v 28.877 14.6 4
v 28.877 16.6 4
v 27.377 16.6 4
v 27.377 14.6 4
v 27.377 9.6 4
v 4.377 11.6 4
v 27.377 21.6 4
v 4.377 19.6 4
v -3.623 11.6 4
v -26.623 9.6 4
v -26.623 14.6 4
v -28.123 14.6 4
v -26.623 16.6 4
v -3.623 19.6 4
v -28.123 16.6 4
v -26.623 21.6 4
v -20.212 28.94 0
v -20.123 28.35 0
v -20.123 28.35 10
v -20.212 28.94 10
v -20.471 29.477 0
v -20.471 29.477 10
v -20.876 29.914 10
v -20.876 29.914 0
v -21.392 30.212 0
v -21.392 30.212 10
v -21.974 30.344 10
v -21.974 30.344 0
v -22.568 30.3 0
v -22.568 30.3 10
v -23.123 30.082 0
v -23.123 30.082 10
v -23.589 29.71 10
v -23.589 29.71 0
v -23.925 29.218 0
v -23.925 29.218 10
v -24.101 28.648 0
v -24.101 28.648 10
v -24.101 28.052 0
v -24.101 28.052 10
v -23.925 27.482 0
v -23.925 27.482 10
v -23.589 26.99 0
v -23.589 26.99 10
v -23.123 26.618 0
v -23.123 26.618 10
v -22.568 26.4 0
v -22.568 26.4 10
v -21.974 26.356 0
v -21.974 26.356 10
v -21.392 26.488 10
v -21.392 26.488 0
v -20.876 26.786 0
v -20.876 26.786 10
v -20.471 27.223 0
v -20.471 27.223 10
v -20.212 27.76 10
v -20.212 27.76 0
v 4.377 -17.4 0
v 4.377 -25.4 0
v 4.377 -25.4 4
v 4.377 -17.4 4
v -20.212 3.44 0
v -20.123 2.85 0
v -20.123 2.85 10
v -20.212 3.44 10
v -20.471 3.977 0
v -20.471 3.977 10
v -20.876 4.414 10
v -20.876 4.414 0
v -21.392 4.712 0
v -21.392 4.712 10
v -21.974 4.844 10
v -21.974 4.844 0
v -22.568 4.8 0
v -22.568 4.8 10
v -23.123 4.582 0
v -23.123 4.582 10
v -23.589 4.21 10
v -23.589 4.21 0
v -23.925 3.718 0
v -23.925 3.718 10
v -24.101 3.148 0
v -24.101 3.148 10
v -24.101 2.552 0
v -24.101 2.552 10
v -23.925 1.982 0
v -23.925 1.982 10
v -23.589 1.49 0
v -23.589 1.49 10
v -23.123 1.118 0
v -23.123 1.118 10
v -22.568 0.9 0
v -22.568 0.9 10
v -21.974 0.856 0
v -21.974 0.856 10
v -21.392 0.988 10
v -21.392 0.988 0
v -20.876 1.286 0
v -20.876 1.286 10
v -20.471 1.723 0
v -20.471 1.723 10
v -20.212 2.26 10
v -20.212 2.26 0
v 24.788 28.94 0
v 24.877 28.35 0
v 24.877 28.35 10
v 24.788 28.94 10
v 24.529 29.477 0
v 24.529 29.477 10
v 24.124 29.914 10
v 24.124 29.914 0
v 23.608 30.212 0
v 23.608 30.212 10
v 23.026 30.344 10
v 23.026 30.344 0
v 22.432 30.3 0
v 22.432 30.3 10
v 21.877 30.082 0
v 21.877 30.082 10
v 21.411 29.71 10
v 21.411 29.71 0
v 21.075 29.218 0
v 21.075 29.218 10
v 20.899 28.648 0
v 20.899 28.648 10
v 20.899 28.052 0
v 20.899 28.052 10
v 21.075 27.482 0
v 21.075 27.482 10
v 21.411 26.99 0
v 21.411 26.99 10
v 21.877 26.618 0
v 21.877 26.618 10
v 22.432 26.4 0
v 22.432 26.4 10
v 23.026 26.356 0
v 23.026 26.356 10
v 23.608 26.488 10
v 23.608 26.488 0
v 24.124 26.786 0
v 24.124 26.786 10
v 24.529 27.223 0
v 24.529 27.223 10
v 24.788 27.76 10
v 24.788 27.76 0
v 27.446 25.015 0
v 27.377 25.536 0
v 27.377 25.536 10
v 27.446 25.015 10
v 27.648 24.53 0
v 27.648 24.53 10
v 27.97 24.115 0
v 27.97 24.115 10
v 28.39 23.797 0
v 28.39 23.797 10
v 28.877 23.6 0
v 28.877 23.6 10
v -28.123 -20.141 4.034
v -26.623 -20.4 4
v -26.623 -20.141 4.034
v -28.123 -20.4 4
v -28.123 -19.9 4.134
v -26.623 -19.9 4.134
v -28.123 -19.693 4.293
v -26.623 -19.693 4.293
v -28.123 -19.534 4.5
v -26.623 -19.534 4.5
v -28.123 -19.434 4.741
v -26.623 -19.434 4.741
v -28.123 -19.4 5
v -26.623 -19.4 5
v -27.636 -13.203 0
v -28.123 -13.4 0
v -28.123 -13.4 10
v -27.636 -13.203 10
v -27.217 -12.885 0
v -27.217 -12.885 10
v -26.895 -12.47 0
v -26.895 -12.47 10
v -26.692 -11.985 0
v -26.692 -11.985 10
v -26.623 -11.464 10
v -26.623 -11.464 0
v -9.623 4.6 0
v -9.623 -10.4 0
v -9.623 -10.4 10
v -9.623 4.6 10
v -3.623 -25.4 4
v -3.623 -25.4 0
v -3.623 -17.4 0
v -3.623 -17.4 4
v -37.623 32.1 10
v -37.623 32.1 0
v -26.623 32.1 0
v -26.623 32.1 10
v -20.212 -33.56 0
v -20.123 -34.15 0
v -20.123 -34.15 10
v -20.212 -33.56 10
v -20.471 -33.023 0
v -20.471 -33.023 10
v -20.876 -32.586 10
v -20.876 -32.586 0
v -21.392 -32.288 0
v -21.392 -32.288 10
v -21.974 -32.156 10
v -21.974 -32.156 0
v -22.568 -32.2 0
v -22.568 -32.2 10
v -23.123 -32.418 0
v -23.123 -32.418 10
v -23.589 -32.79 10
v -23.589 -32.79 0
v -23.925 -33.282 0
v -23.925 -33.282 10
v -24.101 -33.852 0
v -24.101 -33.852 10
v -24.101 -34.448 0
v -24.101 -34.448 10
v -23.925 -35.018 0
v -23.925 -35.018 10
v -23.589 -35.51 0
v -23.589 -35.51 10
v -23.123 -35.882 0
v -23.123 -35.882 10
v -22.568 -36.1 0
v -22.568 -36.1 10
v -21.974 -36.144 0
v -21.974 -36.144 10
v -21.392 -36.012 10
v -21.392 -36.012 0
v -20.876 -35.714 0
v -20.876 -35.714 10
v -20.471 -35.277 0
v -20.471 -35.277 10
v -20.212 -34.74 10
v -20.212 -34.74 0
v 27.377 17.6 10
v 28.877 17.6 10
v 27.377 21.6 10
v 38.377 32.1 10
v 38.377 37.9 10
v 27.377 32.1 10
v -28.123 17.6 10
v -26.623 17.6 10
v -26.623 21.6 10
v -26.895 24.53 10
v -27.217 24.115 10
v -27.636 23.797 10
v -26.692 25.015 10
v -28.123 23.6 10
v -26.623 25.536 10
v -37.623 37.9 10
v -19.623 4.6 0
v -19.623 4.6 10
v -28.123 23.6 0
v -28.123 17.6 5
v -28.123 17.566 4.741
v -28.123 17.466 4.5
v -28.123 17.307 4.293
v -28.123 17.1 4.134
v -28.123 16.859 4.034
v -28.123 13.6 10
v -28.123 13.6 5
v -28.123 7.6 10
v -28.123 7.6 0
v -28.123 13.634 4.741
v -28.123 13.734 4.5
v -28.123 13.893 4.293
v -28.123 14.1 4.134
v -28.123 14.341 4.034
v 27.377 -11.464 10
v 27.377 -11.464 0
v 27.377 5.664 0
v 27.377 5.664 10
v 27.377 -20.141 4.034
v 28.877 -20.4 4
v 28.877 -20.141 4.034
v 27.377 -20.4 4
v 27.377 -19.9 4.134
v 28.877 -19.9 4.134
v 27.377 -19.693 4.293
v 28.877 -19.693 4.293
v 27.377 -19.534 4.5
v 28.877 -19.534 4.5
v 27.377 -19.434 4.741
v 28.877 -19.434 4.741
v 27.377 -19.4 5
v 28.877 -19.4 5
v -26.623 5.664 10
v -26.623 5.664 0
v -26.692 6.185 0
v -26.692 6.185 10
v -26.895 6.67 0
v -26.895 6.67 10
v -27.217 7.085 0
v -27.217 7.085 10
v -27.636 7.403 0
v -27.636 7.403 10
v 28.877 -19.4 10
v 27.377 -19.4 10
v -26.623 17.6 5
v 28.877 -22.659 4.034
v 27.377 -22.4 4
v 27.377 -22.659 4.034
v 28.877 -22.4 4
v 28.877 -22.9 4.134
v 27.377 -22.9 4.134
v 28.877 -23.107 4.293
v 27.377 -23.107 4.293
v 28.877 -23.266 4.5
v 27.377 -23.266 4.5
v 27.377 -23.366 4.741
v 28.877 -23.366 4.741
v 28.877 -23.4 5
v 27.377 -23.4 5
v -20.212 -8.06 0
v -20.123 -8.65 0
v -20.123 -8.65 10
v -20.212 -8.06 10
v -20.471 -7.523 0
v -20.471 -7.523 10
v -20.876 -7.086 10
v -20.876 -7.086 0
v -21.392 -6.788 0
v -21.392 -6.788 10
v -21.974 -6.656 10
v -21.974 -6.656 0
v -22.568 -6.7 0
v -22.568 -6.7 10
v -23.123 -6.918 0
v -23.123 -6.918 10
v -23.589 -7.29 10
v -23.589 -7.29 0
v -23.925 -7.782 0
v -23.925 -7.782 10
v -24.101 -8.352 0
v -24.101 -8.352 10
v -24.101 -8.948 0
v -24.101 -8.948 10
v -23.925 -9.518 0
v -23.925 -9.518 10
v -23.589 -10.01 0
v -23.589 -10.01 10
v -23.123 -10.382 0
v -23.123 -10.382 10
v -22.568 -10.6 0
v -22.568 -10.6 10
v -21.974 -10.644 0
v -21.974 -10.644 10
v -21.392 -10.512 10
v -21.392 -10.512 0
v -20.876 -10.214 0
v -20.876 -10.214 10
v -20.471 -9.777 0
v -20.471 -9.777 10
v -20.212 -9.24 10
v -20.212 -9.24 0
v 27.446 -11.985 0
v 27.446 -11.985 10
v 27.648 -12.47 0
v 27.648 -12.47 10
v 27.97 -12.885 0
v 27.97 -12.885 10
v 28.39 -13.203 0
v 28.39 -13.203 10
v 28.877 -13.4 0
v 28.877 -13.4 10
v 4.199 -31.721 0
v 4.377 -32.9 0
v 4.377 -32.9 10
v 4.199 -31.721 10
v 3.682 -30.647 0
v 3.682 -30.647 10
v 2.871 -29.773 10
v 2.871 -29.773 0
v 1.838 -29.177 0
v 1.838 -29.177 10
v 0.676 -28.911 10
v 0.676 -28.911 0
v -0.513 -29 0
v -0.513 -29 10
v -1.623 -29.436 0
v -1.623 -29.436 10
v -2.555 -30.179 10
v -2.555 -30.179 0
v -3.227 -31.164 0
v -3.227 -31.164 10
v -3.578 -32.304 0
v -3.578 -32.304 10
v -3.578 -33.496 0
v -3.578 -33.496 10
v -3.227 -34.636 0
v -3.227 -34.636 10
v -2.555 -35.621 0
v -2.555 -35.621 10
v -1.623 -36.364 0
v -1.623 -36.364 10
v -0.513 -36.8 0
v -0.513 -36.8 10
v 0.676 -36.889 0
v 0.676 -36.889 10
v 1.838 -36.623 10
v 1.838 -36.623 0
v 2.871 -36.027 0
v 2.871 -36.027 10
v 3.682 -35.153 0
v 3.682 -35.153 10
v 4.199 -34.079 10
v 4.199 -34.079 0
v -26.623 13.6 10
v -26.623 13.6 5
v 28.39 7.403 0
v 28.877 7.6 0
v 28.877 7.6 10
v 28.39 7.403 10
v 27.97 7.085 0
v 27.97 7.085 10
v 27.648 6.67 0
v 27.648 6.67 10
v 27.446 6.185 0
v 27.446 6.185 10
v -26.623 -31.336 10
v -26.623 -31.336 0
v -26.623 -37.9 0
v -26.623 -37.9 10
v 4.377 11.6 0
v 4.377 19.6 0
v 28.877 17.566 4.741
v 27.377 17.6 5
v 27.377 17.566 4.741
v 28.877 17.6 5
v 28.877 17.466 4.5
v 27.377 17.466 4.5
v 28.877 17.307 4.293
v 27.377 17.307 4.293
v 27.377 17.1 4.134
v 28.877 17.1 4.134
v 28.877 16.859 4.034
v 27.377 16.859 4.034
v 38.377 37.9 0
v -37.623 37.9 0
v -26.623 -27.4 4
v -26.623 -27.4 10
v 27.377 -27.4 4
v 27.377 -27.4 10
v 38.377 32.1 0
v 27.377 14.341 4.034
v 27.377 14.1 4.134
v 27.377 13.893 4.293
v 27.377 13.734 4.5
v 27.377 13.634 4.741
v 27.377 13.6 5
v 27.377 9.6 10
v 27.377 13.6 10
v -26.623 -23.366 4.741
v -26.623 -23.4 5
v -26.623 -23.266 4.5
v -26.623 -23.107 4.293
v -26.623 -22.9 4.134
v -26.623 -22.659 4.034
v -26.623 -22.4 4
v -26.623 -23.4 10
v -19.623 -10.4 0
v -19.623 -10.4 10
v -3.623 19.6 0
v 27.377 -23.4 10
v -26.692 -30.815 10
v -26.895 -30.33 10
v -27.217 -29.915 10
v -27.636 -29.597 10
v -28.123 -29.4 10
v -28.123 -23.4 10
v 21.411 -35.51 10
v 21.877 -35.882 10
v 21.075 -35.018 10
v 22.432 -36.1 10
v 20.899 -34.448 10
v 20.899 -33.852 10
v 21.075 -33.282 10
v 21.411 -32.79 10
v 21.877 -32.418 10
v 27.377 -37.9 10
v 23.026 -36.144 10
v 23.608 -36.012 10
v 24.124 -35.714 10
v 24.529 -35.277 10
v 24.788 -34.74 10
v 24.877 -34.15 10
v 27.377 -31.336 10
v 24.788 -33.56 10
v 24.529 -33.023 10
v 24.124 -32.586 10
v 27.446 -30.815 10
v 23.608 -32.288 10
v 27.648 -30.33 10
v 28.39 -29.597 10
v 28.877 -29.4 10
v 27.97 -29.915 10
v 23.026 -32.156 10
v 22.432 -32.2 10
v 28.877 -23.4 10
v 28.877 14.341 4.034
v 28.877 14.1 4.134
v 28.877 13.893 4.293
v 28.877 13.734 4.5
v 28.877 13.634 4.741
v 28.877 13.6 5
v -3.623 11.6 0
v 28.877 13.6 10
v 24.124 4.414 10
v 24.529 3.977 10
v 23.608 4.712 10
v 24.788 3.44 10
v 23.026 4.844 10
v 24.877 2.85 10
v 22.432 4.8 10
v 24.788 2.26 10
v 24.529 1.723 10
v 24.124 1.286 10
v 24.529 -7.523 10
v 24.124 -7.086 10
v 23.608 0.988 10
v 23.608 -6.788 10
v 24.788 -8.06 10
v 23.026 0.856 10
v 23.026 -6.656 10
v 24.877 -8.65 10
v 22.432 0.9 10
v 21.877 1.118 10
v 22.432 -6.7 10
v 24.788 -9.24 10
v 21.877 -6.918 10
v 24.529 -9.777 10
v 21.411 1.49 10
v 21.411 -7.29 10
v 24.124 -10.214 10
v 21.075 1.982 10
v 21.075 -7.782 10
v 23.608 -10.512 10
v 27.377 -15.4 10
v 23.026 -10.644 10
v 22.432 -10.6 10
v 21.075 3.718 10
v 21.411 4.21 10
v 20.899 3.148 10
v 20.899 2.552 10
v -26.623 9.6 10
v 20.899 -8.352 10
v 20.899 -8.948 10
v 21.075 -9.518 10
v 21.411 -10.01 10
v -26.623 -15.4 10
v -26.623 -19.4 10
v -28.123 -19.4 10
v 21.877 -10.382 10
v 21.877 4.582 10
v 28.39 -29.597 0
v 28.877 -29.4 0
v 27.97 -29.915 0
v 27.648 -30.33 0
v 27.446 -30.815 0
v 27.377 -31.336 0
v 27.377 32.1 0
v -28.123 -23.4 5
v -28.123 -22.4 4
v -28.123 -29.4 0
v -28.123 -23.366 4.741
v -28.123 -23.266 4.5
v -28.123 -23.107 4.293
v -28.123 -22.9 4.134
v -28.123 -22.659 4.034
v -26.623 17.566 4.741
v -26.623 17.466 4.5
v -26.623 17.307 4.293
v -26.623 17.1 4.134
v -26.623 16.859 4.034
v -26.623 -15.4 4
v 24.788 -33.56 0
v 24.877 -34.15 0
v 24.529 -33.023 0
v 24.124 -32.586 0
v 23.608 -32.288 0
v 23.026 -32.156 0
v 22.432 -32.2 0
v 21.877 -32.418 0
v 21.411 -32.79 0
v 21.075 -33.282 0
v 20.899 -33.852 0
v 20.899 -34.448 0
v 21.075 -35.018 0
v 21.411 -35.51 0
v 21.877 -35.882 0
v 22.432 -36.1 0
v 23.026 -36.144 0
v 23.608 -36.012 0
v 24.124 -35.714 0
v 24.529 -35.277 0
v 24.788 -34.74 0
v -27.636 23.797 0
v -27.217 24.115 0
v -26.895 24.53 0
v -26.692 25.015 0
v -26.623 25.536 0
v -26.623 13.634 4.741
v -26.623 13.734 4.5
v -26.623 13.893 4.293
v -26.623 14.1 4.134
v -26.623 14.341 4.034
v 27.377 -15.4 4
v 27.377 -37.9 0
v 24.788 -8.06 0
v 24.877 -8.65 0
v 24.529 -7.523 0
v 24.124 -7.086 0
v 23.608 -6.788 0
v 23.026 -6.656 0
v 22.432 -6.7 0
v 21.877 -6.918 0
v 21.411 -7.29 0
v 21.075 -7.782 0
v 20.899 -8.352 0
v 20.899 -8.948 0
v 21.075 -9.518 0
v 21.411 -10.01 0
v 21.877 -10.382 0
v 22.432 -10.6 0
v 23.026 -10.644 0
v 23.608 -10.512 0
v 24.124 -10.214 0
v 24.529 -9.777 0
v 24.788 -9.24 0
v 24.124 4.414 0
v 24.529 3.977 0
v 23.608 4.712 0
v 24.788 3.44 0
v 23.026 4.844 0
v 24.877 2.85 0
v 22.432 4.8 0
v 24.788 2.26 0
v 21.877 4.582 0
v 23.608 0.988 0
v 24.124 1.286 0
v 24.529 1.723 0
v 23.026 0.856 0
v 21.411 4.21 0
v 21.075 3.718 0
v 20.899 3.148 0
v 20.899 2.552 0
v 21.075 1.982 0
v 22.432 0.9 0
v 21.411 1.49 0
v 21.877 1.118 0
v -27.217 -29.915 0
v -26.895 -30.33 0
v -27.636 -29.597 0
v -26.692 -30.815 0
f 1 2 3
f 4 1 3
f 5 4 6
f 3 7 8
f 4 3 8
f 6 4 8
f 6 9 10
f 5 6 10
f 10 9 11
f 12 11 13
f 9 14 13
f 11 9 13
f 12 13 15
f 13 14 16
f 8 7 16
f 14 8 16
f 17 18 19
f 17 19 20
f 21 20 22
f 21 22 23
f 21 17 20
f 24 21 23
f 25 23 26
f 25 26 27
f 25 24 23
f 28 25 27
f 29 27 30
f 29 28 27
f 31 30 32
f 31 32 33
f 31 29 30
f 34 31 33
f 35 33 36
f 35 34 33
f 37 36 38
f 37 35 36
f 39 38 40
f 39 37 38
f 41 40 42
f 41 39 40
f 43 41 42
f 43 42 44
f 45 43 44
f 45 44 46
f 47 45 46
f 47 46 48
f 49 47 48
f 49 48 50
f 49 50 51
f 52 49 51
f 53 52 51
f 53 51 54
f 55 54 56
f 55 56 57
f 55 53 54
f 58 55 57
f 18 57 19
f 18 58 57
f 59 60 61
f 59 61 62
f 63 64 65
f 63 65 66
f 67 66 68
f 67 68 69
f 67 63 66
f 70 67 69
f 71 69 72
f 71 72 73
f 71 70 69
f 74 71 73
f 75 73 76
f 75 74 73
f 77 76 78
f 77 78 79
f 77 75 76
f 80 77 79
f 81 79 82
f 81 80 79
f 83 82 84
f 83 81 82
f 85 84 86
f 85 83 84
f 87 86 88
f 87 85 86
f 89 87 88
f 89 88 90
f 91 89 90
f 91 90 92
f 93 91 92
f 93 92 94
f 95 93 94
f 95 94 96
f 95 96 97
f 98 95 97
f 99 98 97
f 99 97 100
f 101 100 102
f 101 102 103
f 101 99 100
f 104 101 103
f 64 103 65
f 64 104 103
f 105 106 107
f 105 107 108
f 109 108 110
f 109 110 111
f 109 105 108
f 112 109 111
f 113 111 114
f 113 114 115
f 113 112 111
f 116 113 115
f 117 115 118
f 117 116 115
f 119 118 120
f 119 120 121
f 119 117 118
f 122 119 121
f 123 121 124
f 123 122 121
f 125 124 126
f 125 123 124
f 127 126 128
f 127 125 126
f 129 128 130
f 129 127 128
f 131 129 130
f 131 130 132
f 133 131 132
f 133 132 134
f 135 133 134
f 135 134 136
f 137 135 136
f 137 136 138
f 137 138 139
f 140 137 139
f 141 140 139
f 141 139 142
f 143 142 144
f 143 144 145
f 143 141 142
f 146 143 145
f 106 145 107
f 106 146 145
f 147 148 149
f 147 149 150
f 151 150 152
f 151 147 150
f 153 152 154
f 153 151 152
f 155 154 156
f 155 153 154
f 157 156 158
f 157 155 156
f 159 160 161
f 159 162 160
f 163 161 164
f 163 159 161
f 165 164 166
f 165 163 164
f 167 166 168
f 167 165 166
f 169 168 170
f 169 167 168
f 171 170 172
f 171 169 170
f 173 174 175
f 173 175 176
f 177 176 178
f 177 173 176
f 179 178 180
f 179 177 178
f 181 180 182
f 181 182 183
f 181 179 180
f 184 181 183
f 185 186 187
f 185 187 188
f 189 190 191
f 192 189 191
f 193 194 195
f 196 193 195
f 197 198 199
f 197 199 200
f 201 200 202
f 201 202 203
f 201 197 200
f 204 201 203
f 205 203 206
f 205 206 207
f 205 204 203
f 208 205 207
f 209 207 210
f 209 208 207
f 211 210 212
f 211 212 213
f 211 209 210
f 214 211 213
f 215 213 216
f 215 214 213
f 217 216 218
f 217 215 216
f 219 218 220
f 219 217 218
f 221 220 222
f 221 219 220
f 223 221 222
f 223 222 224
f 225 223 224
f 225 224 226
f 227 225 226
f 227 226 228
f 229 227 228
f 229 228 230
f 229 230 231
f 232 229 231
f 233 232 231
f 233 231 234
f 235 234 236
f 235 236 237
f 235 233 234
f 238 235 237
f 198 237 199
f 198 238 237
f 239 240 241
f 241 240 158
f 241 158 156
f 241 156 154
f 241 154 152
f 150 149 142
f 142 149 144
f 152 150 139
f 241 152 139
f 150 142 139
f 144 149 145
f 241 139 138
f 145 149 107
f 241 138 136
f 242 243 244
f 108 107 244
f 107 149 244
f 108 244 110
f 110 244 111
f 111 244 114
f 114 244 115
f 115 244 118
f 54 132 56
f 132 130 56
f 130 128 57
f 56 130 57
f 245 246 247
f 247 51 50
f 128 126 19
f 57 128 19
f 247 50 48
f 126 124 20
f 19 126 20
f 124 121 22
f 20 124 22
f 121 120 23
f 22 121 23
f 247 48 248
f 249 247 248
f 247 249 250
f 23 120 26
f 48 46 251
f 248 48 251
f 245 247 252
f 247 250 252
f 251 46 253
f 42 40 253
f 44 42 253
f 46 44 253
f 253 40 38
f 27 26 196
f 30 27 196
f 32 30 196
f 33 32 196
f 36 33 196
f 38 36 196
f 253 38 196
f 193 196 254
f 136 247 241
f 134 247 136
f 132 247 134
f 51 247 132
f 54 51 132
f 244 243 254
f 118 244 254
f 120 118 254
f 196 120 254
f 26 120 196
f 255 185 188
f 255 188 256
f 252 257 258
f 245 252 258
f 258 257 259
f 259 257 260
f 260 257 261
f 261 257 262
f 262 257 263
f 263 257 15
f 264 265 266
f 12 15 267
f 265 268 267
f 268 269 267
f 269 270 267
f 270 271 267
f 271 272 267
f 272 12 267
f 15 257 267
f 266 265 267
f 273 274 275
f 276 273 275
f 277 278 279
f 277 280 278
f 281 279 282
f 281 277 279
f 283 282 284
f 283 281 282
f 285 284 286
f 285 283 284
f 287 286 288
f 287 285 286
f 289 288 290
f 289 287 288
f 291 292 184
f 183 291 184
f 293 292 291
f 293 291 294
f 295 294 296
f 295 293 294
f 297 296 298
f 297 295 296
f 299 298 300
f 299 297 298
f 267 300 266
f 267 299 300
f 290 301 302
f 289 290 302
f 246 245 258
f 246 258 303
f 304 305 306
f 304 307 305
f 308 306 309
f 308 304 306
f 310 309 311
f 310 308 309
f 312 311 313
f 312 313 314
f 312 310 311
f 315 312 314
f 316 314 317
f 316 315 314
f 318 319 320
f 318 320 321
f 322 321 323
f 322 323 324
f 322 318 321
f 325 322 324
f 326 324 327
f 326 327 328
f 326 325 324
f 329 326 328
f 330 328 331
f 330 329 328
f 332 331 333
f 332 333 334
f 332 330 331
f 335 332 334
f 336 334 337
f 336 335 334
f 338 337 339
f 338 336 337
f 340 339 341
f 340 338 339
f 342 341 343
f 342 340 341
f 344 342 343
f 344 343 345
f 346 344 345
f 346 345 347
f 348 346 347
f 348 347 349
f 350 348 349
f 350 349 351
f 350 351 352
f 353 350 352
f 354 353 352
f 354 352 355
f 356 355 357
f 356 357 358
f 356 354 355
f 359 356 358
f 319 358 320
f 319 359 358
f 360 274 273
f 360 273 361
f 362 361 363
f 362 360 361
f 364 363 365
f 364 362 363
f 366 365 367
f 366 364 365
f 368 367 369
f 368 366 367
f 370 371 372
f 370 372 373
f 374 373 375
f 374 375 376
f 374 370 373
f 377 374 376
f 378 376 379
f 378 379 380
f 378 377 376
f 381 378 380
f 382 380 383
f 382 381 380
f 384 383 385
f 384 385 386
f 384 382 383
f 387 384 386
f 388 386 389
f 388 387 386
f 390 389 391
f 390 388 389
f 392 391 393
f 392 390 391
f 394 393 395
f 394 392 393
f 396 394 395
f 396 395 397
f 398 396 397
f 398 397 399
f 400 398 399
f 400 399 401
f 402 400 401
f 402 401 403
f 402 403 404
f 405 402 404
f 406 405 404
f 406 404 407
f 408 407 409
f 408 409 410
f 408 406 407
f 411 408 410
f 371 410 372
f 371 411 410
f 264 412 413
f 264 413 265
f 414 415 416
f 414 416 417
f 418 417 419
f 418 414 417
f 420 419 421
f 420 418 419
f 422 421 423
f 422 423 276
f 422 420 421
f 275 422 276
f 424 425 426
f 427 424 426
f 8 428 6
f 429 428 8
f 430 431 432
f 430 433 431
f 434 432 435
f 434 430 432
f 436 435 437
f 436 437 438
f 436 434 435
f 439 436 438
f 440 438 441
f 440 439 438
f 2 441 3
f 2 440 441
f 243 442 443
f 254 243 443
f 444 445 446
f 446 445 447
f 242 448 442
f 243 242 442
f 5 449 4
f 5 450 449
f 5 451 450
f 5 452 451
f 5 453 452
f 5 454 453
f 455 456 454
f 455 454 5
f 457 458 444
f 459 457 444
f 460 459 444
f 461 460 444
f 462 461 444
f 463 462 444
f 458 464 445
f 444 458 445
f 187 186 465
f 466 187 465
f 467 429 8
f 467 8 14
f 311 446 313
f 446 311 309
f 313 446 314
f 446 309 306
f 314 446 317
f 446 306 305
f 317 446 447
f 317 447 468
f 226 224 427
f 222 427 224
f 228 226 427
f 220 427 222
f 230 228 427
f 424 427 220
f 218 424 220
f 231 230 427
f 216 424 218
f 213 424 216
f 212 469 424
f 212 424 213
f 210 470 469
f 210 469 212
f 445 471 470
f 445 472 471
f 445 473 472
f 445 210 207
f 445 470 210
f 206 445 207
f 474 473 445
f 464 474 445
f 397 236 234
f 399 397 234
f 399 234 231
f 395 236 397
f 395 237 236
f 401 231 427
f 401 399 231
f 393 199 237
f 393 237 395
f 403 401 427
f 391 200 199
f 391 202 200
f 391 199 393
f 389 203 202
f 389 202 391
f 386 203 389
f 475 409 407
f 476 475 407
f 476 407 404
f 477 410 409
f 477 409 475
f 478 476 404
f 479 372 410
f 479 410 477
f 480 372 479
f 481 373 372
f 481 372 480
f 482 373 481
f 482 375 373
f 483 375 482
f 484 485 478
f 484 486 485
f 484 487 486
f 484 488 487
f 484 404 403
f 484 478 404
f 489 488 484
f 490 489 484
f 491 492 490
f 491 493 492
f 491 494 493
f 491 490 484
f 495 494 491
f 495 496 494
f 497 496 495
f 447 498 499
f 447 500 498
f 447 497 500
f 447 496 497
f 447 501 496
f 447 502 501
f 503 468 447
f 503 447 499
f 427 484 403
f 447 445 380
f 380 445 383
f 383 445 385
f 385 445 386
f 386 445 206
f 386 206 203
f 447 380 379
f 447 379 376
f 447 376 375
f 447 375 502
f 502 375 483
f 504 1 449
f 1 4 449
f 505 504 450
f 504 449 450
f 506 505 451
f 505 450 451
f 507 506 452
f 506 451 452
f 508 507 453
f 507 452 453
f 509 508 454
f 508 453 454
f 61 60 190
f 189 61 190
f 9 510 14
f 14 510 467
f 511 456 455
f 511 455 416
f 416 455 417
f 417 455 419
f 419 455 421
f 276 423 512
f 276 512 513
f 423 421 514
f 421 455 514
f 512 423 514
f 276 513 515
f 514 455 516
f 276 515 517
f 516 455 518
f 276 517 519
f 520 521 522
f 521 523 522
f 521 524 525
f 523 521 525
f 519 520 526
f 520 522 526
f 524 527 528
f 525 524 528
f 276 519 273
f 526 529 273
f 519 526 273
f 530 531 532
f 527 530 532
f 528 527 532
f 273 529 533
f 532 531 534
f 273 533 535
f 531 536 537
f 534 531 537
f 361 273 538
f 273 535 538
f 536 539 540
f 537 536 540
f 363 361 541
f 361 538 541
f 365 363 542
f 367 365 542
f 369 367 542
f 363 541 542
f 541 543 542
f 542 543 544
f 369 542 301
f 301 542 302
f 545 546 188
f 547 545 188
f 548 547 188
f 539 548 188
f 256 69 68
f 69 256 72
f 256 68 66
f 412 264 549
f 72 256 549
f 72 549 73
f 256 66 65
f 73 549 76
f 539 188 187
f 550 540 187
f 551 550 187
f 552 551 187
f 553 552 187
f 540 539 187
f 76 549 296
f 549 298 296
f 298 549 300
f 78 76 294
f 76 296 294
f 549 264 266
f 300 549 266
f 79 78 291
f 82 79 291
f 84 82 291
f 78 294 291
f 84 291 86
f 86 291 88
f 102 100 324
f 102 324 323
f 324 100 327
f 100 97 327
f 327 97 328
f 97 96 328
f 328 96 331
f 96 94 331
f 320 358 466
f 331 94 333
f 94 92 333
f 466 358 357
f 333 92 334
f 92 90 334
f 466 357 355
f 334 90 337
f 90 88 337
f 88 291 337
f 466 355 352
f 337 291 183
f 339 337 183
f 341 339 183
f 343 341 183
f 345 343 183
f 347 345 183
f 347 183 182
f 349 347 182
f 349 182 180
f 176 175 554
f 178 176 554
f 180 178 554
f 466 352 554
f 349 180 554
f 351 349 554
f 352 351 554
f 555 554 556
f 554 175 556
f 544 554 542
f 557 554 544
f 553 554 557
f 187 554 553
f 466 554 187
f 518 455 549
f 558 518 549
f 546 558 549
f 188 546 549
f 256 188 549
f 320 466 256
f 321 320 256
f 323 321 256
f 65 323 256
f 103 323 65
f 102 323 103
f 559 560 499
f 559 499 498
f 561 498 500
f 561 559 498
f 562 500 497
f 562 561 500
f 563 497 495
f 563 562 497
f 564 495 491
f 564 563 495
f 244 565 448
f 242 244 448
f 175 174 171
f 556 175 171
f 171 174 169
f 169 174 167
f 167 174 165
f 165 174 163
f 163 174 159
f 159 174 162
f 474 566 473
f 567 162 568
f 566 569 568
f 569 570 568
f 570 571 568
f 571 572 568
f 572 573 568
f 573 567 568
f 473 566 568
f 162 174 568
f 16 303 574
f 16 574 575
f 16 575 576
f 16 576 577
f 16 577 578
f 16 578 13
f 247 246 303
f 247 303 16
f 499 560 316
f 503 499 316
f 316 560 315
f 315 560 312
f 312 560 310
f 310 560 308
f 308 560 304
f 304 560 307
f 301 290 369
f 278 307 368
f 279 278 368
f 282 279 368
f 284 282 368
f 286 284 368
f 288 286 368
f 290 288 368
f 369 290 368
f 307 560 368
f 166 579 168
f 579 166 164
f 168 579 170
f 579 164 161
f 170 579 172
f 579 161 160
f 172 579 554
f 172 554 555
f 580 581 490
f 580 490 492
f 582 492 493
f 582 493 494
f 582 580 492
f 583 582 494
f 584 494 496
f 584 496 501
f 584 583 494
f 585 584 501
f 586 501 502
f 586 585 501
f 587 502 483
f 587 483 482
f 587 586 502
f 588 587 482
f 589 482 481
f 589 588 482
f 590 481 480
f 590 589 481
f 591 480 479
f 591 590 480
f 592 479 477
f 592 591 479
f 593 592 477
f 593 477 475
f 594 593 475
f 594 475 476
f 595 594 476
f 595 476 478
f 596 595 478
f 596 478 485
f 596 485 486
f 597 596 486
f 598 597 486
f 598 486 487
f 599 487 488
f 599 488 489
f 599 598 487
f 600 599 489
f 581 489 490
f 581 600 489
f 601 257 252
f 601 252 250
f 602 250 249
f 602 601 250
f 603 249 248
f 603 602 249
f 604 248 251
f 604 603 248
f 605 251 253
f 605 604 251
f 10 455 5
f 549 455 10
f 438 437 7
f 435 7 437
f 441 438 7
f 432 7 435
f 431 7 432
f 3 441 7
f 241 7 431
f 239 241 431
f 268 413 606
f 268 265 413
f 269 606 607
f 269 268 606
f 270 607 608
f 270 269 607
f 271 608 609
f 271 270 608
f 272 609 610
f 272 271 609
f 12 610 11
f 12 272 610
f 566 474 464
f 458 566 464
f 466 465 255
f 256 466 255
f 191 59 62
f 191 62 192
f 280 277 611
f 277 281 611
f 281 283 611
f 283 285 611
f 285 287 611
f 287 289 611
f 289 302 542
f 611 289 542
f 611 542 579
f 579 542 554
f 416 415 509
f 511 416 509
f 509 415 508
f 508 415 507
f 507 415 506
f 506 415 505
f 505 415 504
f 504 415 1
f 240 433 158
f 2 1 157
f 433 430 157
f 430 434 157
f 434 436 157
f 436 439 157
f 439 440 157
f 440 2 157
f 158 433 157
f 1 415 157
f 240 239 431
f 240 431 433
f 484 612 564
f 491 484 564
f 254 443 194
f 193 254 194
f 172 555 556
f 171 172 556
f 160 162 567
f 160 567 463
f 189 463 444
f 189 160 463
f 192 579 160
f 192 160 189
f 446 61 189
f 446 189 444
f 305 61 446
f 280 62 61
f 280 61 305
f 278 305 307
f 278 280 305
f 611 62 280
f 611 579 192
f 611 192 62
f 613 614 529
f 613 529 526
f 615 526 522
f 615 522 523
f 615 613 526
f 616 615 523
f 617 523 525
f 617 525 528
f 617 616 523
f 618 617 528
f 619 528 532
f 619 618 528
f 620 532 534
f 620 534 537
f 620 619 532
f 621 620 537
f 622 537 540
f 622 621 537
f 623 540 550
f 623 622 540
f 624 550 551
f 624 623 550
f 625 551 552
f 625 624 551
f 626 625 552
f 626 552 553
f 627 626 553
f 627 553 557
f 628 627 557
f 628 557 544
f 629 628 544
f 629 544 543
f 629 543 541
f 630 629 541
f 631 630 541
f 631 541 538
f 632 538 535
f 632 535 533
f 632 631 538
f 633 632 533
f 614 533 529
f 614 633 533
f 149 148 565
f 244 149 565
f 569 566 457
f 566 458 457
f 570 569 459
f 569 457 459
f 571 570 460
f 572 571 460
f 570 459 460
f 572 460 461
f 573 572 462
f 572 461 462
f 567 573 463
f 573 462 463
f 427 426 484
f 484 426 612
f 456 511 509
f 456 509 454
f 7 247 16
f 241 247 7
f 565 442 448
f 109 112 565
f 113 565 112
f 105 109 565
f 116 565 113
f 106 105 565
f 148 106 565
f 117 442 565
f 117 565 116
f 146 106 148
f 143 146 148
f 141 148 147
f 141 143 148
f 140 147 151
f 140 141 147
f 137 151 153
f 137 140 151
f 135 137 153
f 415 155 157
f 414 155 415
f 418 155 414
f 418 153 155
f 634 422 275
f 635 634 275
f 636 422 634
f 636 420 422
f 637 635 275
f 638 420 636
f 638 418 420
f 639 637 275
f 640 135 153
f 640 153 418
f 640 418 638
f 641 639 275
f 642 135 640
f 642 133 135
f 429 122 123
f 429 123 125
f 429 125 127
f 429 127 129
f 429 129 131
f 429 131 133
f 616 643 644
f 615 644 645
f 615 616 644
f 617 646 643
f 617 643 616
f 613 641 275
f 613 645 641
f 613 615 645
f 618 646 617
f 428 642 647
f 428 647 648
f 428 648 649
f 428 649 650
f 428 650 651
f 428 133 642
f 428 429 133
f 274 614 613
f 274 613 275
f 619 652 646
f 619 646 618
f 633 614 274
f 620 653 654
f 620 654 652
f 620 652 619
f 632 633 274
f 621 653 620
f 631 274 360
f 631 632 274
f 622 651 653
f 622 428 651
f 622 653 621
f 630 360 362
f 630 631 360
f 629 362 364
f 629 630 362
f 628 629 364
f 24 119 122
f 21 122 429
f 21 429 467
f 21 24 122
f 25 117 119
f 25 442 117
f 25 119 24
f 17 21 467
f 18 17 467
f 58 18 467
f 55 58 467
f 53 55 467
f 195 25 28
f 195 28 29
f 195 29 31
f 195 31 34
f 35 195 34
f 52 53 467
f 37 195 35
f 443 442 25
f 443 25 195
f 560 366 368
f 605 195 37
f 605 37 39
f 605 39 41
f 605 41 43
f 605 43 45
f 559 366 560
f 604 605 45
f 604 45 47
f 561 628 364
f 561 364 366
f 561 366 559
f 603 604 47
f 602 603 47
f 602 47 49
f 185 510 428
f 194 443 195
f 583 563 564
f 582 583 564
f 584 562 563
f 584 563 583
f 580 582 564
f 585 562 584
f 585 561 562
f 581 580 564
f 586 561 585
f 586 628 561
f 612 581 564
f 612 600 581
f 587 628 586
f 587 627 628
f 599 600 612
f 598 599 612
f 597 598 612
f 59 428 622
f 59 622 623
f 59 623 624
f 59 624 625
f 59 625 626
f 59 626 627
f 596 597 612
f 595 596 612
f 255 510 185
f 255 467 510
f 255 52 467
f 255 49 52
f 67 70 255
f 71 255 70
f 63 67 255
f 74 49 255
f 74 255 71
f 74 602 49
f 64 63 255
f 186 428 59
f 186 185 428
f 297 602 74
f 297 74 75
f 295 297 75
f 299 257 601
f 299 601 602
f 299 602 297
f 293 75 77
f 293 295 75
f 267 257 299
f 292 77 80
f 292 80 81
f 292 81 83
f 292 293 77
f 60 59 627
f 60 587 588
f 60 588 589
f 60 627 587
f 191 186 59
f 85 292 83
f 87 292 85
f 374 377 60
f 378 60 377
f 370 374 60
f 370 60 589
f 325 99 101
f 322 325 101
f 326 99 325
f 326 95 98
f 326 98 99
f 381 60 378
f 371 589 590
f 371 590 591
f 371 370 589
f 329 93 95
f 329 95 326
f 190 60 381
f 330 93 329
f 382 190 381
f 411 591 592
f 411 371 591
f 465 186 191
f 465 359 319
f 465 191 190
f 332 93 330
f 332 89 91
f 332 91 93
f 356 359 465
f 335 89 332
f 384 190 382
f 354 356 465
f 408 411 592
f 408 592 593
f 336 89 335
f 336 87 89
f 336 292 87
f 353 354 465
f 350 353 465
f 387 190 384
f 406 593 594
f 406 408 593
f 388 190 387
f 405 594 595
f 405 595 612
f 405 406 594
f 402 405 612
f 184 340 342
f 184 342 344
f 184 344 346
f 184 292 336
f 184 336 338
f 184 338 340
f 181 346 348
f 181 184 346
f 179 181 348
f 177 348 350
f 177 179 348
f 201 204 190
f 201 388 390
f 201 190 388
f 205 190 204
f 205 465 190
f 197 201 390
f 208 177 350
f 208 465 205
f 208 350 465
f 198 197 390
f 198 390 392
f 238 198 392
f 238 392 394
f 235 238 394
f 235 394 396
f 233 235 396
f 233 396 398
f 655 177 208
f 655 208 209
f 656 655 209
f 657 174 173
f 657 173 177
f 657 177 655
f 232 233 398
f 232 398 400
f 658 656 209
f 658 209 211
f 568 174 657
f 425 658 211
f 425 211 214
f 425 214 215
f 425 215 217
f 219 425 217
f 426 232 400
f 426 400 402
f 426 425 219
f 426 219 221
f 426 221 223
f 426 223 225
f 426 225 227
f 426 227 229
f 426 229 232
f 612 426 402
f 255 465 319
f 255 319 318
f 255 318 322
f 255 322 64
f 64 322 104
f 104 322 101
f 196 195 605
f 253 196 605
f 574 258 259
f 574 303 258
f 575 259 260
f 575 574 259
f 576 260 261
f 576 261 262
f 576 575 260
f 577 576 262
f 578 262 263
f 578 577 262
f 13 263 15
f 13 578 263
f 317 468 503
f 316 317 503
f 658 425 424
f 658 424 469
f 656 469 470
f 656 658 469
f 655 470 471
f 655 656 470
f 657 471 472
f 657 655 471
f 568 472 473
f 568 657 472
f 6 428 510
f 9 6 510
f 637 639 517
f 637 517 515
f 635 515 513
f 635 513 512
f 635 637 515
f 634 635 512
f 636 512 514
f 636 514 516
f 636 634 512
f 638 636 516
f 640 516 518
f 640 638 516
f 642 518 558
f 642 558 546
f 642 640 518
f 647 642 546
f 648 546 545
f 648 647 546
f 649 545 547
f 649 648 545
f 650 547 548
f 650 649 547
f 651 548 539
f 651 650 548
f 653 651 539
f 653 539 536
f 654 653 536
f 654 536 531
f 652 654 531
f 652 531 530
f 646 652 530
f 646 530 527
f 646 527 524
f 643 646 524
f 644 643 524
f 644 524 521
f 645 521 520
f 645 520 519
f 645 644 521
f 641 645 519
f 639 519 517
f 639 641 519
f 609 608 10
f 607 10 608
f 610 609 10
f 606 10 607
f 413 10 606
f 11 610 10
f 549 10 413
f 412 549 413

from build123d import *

# Parameters (mm, degrees)
ESBO_O1_R                = 2
ESBO_O1_R_2              = 4
RESSALTO_EXTRUS_O1_DEPTH = 10
ESBO_O7_W                = 10
ESBO_O7_H                = 15
ESBO_O7_W_2              = 8
ESBO_O7_H_2              = 8
CORTE_EXTRUS_O1_DEPTH    = 55.856129841
CORTE_EXTRUS_O7_DEPTH    = 6
FILETE1_R                = 1
FILETE2_R                = 2


with BuildPart() as part:
    # Esboço1 → Ressalto-extrusão1 (new body)
    with BuildSketch(Plane.XY):
        Polygon((-26.623119185, 32.1), (-26.623119185, 23.6), (-28.123119185, 23.6), (-28.123119185, 7.6), (-26.623119185, 7.6), (-26.623119185, -13.4), (-28.123119185, -13.4), (-28.123119185, -29.4), (-26.623119185, -29.4), (-26.623119185, -37.9), (27.376880815, -37.9), (27.376880815, -29.4), (28.876880815, -29.4), (28.876880815, -13.4), (27.376880815, -13.4), (27.376880815, 7.6), (28.876880815, 7.6), (28.876880815, 23.6), (27.376880815, 23.6), (27.376880815, 32.1), (38.376880815, 32.1), (38.376880815, 37.9), (-37.623119185, 37.9), (-37.623119185, 32.1), align=None)
        with Locations((-22.123119185, 28.35)):
            Circle(ESBO_O1_R, mode=Mode.SUBTRACT)
        with Locations((22.876880815, 28.35)):
            Circle(ESBO_O1_R, mode=Mode.SUBTRACT)
        with Locations((22.876880815, -34.15)):
            Circle(ESBO_O1_R, mode=Mode.SUBTRACT)
        with Locations((-22.123119185, -34.15)):
            Circle(ESBO_O1_R, mode=Mode.SUBTRACT)
        with Locations((-22.123119185, -8.65)):
            Circle(ESBO_O1_R, mode=Mode.SUBTRACT)
        with Locations((22.876880815, -8.65)):
            Circle(ESBO_O1_R, mode=Mode.SUBTRACT)
        with Locations((-22.123119185, 2.85)):
            Circle(ESBO_O1_R, mode=Mode.SUBTRACT)
        with Locations((22.876880815, 2.85)):
            Circle(ESBO_O1_R, mode=Mode.SUBTRACT)
        with Locations((0.376880815, -32.9)):
            Circle(ESBO_O1_R_2, mode=Mode.SUBTRACT)
    extrude(amount=RESSALTO_EXTRUS_O1_DEPTH)

    # Esboço7 → Corte-extrusão1 (cut, through all)
    with BuildSketch(Plane(origin=(0, 0, 0), x_dir=(-1, 0, 0), z_dir=(0, 0, -1))):
        with Locations((14.623119185, -2.9)):
            Rectangle(ESBO_O7_W, ESBO_O7_H)
        with Locations((-0.376880815, 15.6)):
            Rectangle(ESBO_O7_W_2, ESBO_O7_H_2)
        with Locations((-0.376880815, -21.4)):
            Rectangle(ESBO_O7_W_2, ESBO_O7_H_2)
    extrude(amount=-CORTE_EXTRUS_O1_DEPTH, mode=Mode.SUBTRACT)

    # Esboço9 → Corte-extrusão7 (cut)
    with BuildSketch(Plane.XY.offset(10)):
        Polygon((27.376880815, 9.6), (-26.623119185, 9.6), (-26.623119185, 13.6), (-28.623119185, 13.6), (-28.623119185, 17.6), (-26.623119185, 17.6), (-26.623119185, 21.6), (27.376880815, 21.6), (27.376880815, 17.6), (29.376880815, 17.6), (29.376880815, 13.6), (27.376880815, 13.6), align=None)
        Polygon((27.376880815, -15.4), (-26.623119185, -15.4), (-26.623119185, -19.4), (-28.623119185, -19.4), (-28.623119185, -23.4), (-26.623119185, -23.4), (-26.623119185, -27.4), (27.376880815, -27.4), (27.376880815, -23.4), (29.376880815, -23.4), (29.376880815, -19.4), (27.376880815, -19.4), align=None)
    extrude(amount=-CORTE_EXTRUS_O7_DEPTH, mode=Mode.SUBTRACT)

    # Filete1
    filete1_edges = [part.edges().sort_by_distance(p)[0] for p in [
        (28.126880815, 17.6, 4),
        (28.126880815, 13.6, 4),
        (-27.373119185, 13.6, 4),
        (-27.373119185, 17.6, 4),
        (28.126880815, -19.4, 4),
        (28.126880815, -23.4, 4),
        (-27.373119185, -23.4, 4),
        (-27.373119185, -19.4, 4),
    ]]
    fillet(filete1_edges, radius=FILETE1_R)

    # Filete2
    # the kernel refuses this fillet: 2 mm, written as the material it adds along each edge
    with BuildSketch(Plane(origin=(-26.623119185, 23.6, 0), x_dir=(0, 1, 0), z_dir=(0, 0, 1)), Plane(origin=(27.376880815, -29.4, 0), x_dir=(0, -1, 0), z_dir=(0, 0, 1))) as filete2_piece_1:
        with BuildLine():
            CenterArc((1.936491673, 2), FILETE2_R, 194.477512186, 75.522487814)
            Line((0, 1.5), (-0.038729833, 1.49))
            ThreePointArc((-0.038729833, 1.49), (-0.04, 0.75), (-0.04, 0))
            Line((-0.04, 0), (0, -0.04))
            Line((0, -0.04), (1.936491673, -0.04))
            Line((1.936491673, -0.04), (1.936491673, 0))
        make_face()
    extrude(amount=10)
    with BuildSketch(Plane(origin=(27.376880815, 23.6, 0), x_dir=(1, 0, 0), z_dir=(0, 0, 1)), Plane(origin=(-26.623119185, -29.4, 0), x_dir=(-1, 0, 0), z_dir=(0, 0, 1))) as filete2_piece_2:
        with BuildLine():
            CenterArc((2, 1.936491673), FILETE2_R, 180, 75.522487814)
            Line((0, 1.936491673), (-0.04, 1.936491673))
            Line((-0.04, 1.936491673), (-0.04, 0))
            Line((-0.04, 0), (0, -0.04))
            ThreePointArc((0, -0.04), (0.75, -0.04), (1.49, -0.038729833))
            Line((1.49, -0.038729833), (1.5, 0))
        make_face()
    extrude(amount=10)
    with BuildSketch(Plane(origin=(27.376880815, 7.6, 0), x_dir=(1, 0, 0), z_dir=(0, 0, 1)), Plane(origin=(-26.623119185, -13.4, 0), x_dir=(-1, 0, 0), z_dir=(0, 0, 1))) as filete2_piece_3:
        with BuildLine():
            CenterArc((2, -1.936491673), FILETE2_R, 104.477512186, 75.522487814)
            Line((0, -1.936491673), (-0.04, -1.936491673))
            Line((-0.04, -1.936491673), (-0.04, 0))
            Line((-0.04, 0), (0, 0.04))
            ThreePointArc((0, 0.04), (0.75, 0.04), (1.49, 0.038729833))
            Line((1.49, 0.038729833), (1.5, 0))
        make_face()
    extrude(amount=10)
    with BuildSketch(Plane(origin=(27.376880815, -13.4, 0), x_dir=(0, 1, 0), z_dir=(0, 0, 1)), Plane(origin=(-26.623119185, 7.6, 0), x_dir=(0, -1, 0), z_dir=(0, 0, 1))) as filete2_piece_4:
        with BuildLine():
            CenterArc((1.936491673, -2), FILETE2_R, 90, 75.522487814)
            Line((0, -1.5), (-0.038729833, -1.49))
            ThreePointArc((-0.038729833, -1.49), (-0.04, -0.75), (-0.04, 0))
            Line((-0.04, 0), (0, 0.04))
            Line((0, 0.04), (1.936491673, 0.04))
            Line((1.936491673, 0.04), (1.936491673, 0))
        make_face()
    extrude(amount=10)


solid = part.part
